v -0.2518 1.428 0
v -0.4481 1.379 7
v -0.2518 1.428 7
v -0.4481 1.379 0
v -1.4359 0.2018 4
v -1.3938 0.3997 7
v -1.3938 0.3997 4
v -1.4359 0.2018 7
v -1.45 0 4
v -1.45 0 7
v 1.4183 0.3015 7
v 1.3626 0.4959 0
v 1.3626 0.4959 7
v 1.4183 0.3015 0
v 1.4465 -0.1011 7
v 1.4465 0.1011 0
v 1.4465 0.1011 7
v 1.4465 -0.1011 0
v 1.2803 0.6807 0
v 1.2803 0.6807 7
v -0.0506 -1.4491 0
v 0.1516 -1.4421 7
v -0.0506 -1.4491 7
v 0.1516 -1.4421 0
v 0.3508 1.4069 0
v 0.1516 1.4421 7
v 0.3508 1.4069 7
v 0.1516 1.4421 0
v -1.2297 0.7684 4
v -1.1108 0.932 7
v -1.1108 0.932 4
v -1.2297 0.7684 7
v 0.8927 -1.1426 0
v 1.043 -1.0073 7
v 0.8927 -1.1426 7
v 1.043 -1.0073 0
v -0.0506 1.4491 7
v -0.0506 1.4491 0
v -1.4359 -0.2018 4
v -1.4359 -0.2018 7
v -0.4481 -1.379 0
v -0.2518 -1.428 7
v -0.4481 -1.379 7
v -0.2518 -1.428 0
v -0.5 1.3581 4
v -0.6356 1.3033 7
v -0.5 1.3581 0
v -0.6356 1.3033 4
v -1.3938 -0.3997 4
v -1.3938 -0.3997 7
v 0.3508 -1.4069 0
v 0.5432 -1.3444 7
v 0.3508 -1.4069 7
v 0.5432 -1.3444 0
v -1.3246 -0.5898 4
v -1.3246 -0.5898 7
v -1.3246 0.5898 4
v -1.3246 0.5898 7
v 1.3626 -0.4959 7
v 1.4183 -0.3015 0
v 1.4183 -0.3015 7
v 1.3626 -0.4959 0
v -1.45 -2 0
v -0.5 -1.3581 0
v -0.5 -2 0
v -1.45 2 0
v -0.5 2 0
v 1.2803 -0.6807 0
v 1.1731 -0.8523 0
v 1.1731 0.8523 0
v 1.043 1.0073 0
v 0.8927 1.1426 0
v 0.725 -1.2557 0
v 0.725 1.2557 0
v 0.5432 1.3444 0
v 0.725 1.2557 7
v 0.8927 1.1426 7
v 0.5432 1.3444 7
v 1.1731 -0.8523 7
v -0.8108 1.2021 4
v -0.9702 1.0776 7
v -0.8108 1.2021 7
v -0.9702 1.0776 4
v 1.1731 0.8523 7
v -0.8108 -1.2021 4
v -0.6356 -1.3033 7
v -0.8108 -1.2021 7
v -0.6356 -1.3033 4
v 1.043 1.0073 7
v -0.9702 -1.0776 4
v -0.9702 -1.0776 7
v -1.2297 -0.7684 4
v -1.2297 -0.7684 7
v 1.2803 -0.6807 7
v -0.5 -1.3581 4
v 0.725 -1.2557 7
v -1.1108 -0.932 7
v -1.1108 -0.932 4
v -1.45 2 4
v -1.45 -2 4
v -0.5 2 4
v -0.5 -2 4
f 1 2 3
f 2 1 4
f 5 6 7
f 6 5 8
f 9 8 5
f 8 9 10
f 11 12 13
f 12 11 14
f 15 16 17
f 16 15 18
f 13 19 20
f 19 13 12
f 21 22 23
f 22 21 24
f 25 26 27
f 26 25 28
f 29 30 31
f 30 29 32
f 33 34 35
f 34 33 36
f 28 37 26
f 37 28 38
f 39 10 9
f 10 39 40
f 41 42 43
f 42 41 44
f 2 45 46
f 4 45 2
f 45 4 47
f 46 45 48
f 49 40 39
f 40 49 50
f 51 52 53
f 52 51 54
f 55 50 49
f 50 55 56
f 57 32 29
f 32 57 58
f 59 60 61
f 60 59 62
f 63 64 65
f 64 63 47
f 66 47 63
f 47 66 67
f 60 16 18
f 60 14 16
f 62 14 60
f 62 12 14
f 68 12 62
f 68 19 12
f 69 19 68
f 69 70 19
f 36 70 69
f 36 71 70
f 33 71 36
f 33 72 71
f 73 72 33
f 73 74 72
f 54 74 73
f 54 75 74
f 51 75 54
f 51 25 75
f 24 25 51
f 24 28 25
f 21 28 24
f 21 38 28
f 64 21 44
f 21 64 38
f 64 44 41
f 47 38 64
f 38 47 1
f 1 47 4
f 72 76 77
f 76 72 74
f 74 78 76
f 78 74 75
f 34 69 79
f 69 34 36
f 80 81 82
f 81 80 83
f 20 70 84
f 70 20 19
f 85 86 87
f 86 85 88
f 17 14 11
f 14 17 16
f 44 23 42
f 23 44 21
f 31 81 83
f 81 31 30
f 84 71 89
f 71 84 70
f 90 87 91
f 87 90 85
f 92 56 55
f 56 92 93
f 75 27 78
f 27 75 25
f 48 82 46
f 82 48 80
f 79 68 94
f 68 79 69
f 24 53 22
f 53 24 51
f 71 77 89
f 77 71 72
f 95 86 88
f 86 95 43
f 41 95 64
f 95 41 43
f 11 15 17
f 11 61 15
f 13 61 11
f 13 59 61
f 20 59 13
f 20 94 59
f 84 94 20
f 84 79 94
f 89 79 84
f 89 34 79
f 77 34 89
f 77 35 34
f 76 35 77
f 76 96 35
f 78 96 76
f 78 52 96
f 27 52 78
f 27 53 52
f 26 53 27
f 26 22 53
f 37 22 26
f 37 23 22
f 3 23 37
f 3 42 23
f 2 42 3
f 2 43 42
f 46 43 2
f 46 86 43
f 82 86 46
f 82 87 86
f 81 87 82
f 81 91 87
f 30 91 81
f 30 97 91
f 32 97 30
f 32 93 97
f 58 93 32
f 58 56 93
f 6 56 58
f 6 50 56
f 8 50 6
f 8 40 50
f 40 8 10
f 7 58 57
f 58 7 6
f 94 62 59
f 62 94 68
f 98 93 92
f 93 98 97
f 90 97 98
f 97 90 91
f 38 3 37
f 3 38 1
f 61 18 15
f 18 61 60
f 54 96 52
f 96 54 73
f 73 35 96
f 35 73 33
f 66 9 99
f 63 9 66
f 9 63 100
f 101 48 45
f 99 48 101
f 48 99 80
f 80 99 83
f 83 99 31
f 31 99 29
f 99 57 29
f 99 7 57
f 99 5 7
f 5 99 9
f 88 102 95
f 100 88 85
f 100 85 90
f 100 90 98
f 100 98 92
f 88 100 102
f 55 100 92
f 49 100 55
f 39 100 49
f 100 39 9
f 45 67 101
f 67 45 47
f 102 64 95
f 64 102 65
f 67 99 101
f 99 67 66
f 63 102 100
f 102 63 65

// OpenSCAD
use <MCAD/involute_gears.scad>

module cutout() {
	difference() {
		rotate([45,0,0]) cube([33,9,9]);
		translate([-0.5,-6,11]) cube([34,10,10]);
		translate([-0.5,6.3,0]) cube([34,10,10]);
		translate([-0.5,-16.3,0]) cube([34,10,10]);
	}
}

module cageUp(withServo) {
	difference() {
		union() {
			translate([-12.5,-8,0]) cube([25,16,17.2]);
			difference() {
				translate([-16.1,-8,10]) cube([32.2,16,7.2]);
				translate([11,-8.25,11]) rotate([0,45,0]) cube([30, 16.5, 30]);		
				translate([-11,-8.25,11]) rotate([0,-135,0]) cube([10, 16.5, 10]);
			}
		}
		translate([-11.75,-6.3,1]) cube([23.5,12.6,16.3]);
		translate([-13,-6.3,3]) cube([26,12.6,7]);
		translate([-16.5,0,3.65]) cutout();
		translate([-10,-8.1,1]) cube([20,16.2,10]);
		translate([-5,-8.1,1]) cube([10,16.2,14.7]);
		translate([-3.7,-10,4.65]) rotate([0, 0, 90]) cutout();
		translate([3.7,-10,4.65]) rotate([0, 0, 90]) cutout();
		translate([13.75,0,14.3]) cylinder(r=1,h=3,$fn=45);
		translate([-13.75,0,14.3]) cylinder(r=1,h=3,$fn=45);
	}
	if (withServo) {
		translate([11.5,6.3,1]) rotate([0,0,180]) servo();
	}
}

module cageSide(withServo, mount) {
	difference() {
		rotate([-90,0,0]) union() {
			translate([-13.5,-8,0]) cube([27,16,17.2]);
			translate([-16.1,-8,12.2]) cube([32.2,16,5]);
		}
		rotate([-90,0,0]) translate([-11.75,-6.3,1]) cube([23.5,12.6,16.3]);
		rotate([-90,0,0]) translate([11,-12,3.5]) cube([3,15,4]);
		rotate([-90,0,0]) translate([13.75,0,10.3]) cylinder(r=1,h=8,$fn=45);
		rotate([-90,0,0]) translate([-13.75,0,10.3]) cylinder(r=1,h=8,$fn=45);
		rotate([-90,0,0]) translate([-11.75,-10,1]) cube([23.5,12.6,16.3]);
	}
	if (mount) {
		translate([5.5, 0, 0]) rotate([90, 0, 0]) union() {
			cylinder(r=6.2, h=0.5, $fn=45);
			difference() {
				cylinder(r=5, h=3.5, $fn=45);
				translate([0,0,-0.05]) cylinder(r=1.1, h=4, $fn=45);
			}
		}
		color("Green") rotate([-90,0,0]) translate([5.3, 4.95, -3.5]) cube([0.4, 5, 2.5]);
	}
	if (withServo) {
		translate([11.8,1,-6.3]) rotate([90,0,180]) servo();
	}
}

module footBar(length,width,height) {
	translate([-length/2,-width/2,0]) cube([length,width,height]);
	translate([-length/2,0,0]) cylinder(r=width/2,h=height,$fn=45);
	translate([length/2,0,0]) cylinder(r=width/2,h=height,$fn=45);
}

module foot(withServo) {
	footBar(100,10,3);
	rotate([0,0,90]) footBar(100,10,3);
	translate([-5.5,0,2]) cageUp(withServo);
	translate([-18,-8,0]) cube([25,16,3]);
}

module swing(withServo) {
	difference() {
		union() {
			translate([-5.5,-12.5,12.9]) cageSide(withServo, true);
			difference() {
				union() {
					cylinder(r=20,h=5,$fn=45);
					translate([-45, 17.5, 2.5]) rotate([0, 90, 0]) cylinder(r=2.5, h=45, $fn=45);
					translate([-27, 17.4, 2.5]) rotate([60, 90, 0]) cylinder(r=2.5, h=20, $fn=45);
				}
				
				translate([0, -18, 5.1]) cube([30, 10, 2], center=true);
				*ranslate([0, 18, 5.1]) cube([30, 10, 2], center=true);
			}
		}
		translate([0,0,0.5]) cylinder(r=2.5,h=10,$fn=45);
		translate([0,0,-3]) cylinder(r=1,h=10,$fn=45);

		for(i=[4.5:1.5:16]) {
			
			translate([i,0,-0.05]) cylinder(r=0.5,h=3,$fn=45);
			translate([-i,0,-0.55]) cylinder(r=0.5,h=3,$fn=45);
			translate([0,i,-0.05]) cylinder(r=0.5,h=3,$fn=45);
			translate([0,-i,-0.05]) cylinder(r=0.5,h=3,$fn=45);
		}
	}
}

module armPart(ri) {
	difference() {
		union() {
			cube([20, 2, 16]);
			translate([0,0,8]) rotate([-90,0,0]) cylinder(r=8, h=2, $fn=45);
		}
		translate([0, -0.1, 8]) rotate([-90,0,0]) cylinder(r=ri, h=2.2, $fn=45);
	}
}

module rampPart(length) {
	difference() {
		cube([length, 8, 8]);
		translate([0,3,0]) rotate([30, 0, 0]) translate([-0.1, -8, 0]) cube([length+0.2,8,8]);
		translate([-0.1,5,0]) rotate([-30, 0, 0]) cube([length+0.2,8,8]);
		translate([-0.1,4,10]) rotate([0,90,0]) cylinder(r=5, h=length+0.2, $fn=45);
	}
}

module springHolder() {
	rampPart(20);
	translate([1.7,0,0.1]) rotate([0,-15,0]) translate([-5,0,0]) rampPart(5);
	translate([-1.5,0,-0.7]) rotate([0,-30,0]) translate([-5,0,0]) rampPart(5);
	translate([18,4,0]) cylinder(r=1, h=8, $fn=45);
	translate([18,4,4.5]) rotate([0,30,0]) cylinder(r=1, h=4, $fn=45);
	translate([18.5,4,7.5]) cylinder(r=1.5, h=1, $fn=45);
	translate([19.5,4,7.5]) cylinder(r=1.5, h=1, $fn=45);
	translate([18.5,2.5,7.5]) cube([1,3,1]);
}

module arm(withServo, spring) {
	translate([44,-12.5,8]) difference() {
		cageSide(withServo, true);
		translate([0,0,-13]) cube([40,40,10], center=true);
	}
	translate([0,-15,0]) armPart(5.2);
	translate([0,15.5,0]) armPart(3.6);
	translate([20, -15, 0]) rotate([0, 0, 45]) cube([6, 2, 16]);
	translate([22.5, -12.5, 0]) cube([8, 2, 16]);
	translate([20, 17.5, 0]) rotate([0, 0, -45]) translate([0, -2, 0]) cube([6.35, 2, 16]);
	translate([22.5, -12.5, 0]) cube([2, 25.5, 16]);
	translate([23, -0.3, 0]) cube([5, 5, 16]);
	translate([9, 17.4, 0]) cube([6,4.5,5]);
	translate([9, 19.9, 4.9]) cube([6,2,6.2]);
	translate([9, 17.4, 11]) cube([6,4.5,5]);
	if (spring) {
		translate([0,12.5,15.9]) springHolder();
	}
}

module armFront(withServo) {
	translate([28,0.5,8]) rotate([0,0,-90]) difference() {
		cageSide(withServo, false);
		translate([-20,15.3,-10]) cube([43,2,20]);
	}
	translate([0,-15,0]) armPart(5.2);
	translate([0,15.5,0]) armPart(3.6);
	translate([20, -15, 0]) rotate([0, 0, 45]) cube([6, 2, 16]);
	translate([21.5, -13, 0]) cube([7, 2, 16]);
	translate([22.5, 12, 0]) cube([6, 2, 16]);
	translate([20, 17.5, 0]) rotate([0, 0, -45]) translate([0, -2, 0]) cube([6.35, 2, 16]);
	translate([22.5, -13, 0]) cube([2, 27, 16]);
	translate([9, 17.4, 0]) cube([6,4.5,5]);
	translate([9, 19.9, 4.9]) cube([6,2,6.2]);
	translate([9, 17.4, 11]) cube([6,4.5,5]);
}

module frontPlate() {
	rotate([0,-90,0]) difference() {
		cube([2,43,20]);
		translate([-4,31.25,10]) rotate([0,90,0]) cylinder(r=1,h=8,$fn=45);
		translate([-4,3.75,10]) rotate([0,90,0]) cylinder(r=1,h=8,$fn=45);
		translate([-1,5.75,3.75]) cube([4,23.5,12.6]);
	}
}

module gripperGear(outerRadius,innerRadius) {
	outerteeth=10;
	pitch = outerRadius/outerteeth*360;
	echo("pitch: ", pitch);
	innerteeth=12;
	innerpitch = innerRadius/innerteeth*360;
	rotate([0,0,-4]) difference() {
		gear (number_of_teeth=outerteeth,
			pressure_angle=18,
			circular_pitch=pitch,
   	   gear_thickness = 3,
      	rim_thickness = 3,
	      hub_thickness = 3,
			bore_diameter = 1.5);
		translate([0,0,1]) 
			gear (number_of_teeth=innerteeth,
				pressure_angle=45,
				circular_pitch=innerpitch,
   		   gear_thickness = 2.5,
      		rim_thickness = 2.5,
	      	hub_thickness = 2.5,
				bore_diameter = 0);
	}
}

module gripper() {
	difference() {
		cube([40,23.6,11.5]);
		translate([17.5,3.5,-0.5]) cube([24,16.6,13]);
		translate([19.5,1.5,-0.5]) cube([12,20.6,13]);
		translate([35.6,1.6,-0.5]) cube([2.7, 20.4, 20]);
		translate([0,-0.1,5]) rotate([0,-12,0]) cube([38,24,11.5]);
		translate([46,0,0]) rotate([0,0,45]) translate([-5,-5,-0.1]) cube([10,10,12]);
		translate([31.5,8.6,0]) rotate([0,0,45]) translate([-5,-5,-0.1]) cube([10,10,12]);
		translate([46,23.6,0]) rotate([0,0,45]) translate([-5,-5,-0.1]) cube([10,10,12]);
		translate([31.5,15,0]) rotate([0,0,45]) translate([-5,-5,-0.1]) cube([10,10,12]);
		translate([9,-1.8,0]) rotate([0,0,45]) translate([-7.5,-7.5,-0.1]) cube([15,15,12]);
		translate([9,25.3,0]) rotate([0,0,45]) translate([-7.5,-7.5,-0.1]) cube([15,15,12]);
		translate([-0.1,-0.1,-0.1]) cube([9.1, 9, 12]);
		translate([-0.1,14.7,-0.1]) cube([9.1, 9, 12]);
		translate([12.7,11.8,-0.1]) cylinder(r=3,h=12);
		translate([20,0.5,-1.1]) cube([3.6,4.8,10]);
		translate([21.8,2,3.1]) rotate(a=90, v=[1,0,0]) cylinder(r=1.5,h=5,$fn=45);
		*translate([19.5,-0.1,3]) cube([3.7,2.5,1.4]);
		*translate([23.5,-0.1,2]) cube([3.9,2.5,4.4]);
	}
	difference() {
		translate([-6,7,0])
			cube([10,10,10]);
		translate([-10,-0.1,2.88]) rotate([0,-12,0]) cube([38,24,11.5]);
	}
	
*%	translate([0,0,11.5]) rotate([-90,0,0]) scale([10,10,10]) import("Gripper_v5.stl");
}


module gripperWithRack() {
translate([-20,5,0]) {
	rotate(a=-90, v=[0,1,0])
		translate([0.5,-8.8,-23.5])
			gripperRack();
	
	rotate(a=90, v=[1,0,0])
		gripper();
}
}

module gripperRack() {
	difference() {
		cube([4.8,40,3.5]);
		translate([-1,38,1.75])
			rotate(a=90, v=[0,1,0])
				cylinder(r=1.5, h=3, $fn=45);
	}
	translate([-3.7, 40.13 , 0])
		rotate(a=-30, v=[0,0,1])
			*cube([6.3, 3.5, 3.5]);

	for (i=[0:8]) {
		translate([1.3, 4 + 2.96*i, 0]) rackTooth();
	}
	translate([-1,5.7,1.7])
		rotate(a=90,v=[0,1,0]) {
			cylinder(r=1.45,h=3,$fn=45);
			translate([0,-0.2,0])
			cube([1.7,0.4,1]);
		}
	*translate([-2.45,4,0]) cube([2.5,1,3.5]);
	*translate([-4.4,2.5,0]) cube([2,4,3.5]);
}

module rackTooth() {
	difference() {
		translate([-0.5,0,0]) linear_exturde_flat_option(height=3.5) {
		involute_gear_tooth(5,5,5,6,7.5,10);
		}
		translate([-3.2,-3.2,-0.1]) cube([5,5,4]);
	}
}

module servo() {
	color("LightBlue", 0.5) {
		cube([23.5,12.6,16.4]);
		translate([-4.65,0,16.3]) difference() {
			cube([32.8,12.6,2]);
			translate([2.65,6.3,-0.1]) cylinder(r=1,h=3,$fn=45);
			translate([32.8-2.65,6.3,-0.1]) cylinder(r=1,h=3,$fn=45);
		}
		translate([0,0,18.2]) cube([23.5,12.6,4.4]);
		translate([6.3,6.3,22.5]) cylinder(r=6.3,h=4.1,$fn=45);
		translate([6.3,6.3,26.5]) cylinder(r=2.25,h=2.8,$fn=45);
	}
}



module stopper() {
	translate([0,0,7])
	rotate(a=180,v=[0,1,0]) {
	cylinder(r=1.45, h=7, $fn=45);
	translate([0.5,-2,3])
		cube([0.95,4,4]);
	}
}

module overview() {
	foot(true);
	translate([0,0,38]) swing(true);
	translate([0,0,43]) arm(true, true);
	translate([49.5,0,43]) arm(true, false);
	translate([99,0,43]) {
		armFront(true);
		translate([45,18,-2]) rotate([180,90,0]) frontPlate();
		translate([81,-15.5,20]) rotate([90,180,0]) gripper();
// gripperRack and gripperGear are commented because
// they slow down rendering considerably on my PC
		translate([58,-22.5,18]) rotate([0,90,0]) gripperRack();
		translate([81,3.5,-3]) rotate([-90,180,0]) gripper();
		translate([58,12.5,-1]) rotate([0,-90,180]) gripperRack();
		translate([61,-5,8.5]) rotate([0,-90,0]) gripperGear(4.5,2.5);
	}
}
*swing(false);
*gripperRack();
*gripper();
*gripperWithRack();
stopper();
